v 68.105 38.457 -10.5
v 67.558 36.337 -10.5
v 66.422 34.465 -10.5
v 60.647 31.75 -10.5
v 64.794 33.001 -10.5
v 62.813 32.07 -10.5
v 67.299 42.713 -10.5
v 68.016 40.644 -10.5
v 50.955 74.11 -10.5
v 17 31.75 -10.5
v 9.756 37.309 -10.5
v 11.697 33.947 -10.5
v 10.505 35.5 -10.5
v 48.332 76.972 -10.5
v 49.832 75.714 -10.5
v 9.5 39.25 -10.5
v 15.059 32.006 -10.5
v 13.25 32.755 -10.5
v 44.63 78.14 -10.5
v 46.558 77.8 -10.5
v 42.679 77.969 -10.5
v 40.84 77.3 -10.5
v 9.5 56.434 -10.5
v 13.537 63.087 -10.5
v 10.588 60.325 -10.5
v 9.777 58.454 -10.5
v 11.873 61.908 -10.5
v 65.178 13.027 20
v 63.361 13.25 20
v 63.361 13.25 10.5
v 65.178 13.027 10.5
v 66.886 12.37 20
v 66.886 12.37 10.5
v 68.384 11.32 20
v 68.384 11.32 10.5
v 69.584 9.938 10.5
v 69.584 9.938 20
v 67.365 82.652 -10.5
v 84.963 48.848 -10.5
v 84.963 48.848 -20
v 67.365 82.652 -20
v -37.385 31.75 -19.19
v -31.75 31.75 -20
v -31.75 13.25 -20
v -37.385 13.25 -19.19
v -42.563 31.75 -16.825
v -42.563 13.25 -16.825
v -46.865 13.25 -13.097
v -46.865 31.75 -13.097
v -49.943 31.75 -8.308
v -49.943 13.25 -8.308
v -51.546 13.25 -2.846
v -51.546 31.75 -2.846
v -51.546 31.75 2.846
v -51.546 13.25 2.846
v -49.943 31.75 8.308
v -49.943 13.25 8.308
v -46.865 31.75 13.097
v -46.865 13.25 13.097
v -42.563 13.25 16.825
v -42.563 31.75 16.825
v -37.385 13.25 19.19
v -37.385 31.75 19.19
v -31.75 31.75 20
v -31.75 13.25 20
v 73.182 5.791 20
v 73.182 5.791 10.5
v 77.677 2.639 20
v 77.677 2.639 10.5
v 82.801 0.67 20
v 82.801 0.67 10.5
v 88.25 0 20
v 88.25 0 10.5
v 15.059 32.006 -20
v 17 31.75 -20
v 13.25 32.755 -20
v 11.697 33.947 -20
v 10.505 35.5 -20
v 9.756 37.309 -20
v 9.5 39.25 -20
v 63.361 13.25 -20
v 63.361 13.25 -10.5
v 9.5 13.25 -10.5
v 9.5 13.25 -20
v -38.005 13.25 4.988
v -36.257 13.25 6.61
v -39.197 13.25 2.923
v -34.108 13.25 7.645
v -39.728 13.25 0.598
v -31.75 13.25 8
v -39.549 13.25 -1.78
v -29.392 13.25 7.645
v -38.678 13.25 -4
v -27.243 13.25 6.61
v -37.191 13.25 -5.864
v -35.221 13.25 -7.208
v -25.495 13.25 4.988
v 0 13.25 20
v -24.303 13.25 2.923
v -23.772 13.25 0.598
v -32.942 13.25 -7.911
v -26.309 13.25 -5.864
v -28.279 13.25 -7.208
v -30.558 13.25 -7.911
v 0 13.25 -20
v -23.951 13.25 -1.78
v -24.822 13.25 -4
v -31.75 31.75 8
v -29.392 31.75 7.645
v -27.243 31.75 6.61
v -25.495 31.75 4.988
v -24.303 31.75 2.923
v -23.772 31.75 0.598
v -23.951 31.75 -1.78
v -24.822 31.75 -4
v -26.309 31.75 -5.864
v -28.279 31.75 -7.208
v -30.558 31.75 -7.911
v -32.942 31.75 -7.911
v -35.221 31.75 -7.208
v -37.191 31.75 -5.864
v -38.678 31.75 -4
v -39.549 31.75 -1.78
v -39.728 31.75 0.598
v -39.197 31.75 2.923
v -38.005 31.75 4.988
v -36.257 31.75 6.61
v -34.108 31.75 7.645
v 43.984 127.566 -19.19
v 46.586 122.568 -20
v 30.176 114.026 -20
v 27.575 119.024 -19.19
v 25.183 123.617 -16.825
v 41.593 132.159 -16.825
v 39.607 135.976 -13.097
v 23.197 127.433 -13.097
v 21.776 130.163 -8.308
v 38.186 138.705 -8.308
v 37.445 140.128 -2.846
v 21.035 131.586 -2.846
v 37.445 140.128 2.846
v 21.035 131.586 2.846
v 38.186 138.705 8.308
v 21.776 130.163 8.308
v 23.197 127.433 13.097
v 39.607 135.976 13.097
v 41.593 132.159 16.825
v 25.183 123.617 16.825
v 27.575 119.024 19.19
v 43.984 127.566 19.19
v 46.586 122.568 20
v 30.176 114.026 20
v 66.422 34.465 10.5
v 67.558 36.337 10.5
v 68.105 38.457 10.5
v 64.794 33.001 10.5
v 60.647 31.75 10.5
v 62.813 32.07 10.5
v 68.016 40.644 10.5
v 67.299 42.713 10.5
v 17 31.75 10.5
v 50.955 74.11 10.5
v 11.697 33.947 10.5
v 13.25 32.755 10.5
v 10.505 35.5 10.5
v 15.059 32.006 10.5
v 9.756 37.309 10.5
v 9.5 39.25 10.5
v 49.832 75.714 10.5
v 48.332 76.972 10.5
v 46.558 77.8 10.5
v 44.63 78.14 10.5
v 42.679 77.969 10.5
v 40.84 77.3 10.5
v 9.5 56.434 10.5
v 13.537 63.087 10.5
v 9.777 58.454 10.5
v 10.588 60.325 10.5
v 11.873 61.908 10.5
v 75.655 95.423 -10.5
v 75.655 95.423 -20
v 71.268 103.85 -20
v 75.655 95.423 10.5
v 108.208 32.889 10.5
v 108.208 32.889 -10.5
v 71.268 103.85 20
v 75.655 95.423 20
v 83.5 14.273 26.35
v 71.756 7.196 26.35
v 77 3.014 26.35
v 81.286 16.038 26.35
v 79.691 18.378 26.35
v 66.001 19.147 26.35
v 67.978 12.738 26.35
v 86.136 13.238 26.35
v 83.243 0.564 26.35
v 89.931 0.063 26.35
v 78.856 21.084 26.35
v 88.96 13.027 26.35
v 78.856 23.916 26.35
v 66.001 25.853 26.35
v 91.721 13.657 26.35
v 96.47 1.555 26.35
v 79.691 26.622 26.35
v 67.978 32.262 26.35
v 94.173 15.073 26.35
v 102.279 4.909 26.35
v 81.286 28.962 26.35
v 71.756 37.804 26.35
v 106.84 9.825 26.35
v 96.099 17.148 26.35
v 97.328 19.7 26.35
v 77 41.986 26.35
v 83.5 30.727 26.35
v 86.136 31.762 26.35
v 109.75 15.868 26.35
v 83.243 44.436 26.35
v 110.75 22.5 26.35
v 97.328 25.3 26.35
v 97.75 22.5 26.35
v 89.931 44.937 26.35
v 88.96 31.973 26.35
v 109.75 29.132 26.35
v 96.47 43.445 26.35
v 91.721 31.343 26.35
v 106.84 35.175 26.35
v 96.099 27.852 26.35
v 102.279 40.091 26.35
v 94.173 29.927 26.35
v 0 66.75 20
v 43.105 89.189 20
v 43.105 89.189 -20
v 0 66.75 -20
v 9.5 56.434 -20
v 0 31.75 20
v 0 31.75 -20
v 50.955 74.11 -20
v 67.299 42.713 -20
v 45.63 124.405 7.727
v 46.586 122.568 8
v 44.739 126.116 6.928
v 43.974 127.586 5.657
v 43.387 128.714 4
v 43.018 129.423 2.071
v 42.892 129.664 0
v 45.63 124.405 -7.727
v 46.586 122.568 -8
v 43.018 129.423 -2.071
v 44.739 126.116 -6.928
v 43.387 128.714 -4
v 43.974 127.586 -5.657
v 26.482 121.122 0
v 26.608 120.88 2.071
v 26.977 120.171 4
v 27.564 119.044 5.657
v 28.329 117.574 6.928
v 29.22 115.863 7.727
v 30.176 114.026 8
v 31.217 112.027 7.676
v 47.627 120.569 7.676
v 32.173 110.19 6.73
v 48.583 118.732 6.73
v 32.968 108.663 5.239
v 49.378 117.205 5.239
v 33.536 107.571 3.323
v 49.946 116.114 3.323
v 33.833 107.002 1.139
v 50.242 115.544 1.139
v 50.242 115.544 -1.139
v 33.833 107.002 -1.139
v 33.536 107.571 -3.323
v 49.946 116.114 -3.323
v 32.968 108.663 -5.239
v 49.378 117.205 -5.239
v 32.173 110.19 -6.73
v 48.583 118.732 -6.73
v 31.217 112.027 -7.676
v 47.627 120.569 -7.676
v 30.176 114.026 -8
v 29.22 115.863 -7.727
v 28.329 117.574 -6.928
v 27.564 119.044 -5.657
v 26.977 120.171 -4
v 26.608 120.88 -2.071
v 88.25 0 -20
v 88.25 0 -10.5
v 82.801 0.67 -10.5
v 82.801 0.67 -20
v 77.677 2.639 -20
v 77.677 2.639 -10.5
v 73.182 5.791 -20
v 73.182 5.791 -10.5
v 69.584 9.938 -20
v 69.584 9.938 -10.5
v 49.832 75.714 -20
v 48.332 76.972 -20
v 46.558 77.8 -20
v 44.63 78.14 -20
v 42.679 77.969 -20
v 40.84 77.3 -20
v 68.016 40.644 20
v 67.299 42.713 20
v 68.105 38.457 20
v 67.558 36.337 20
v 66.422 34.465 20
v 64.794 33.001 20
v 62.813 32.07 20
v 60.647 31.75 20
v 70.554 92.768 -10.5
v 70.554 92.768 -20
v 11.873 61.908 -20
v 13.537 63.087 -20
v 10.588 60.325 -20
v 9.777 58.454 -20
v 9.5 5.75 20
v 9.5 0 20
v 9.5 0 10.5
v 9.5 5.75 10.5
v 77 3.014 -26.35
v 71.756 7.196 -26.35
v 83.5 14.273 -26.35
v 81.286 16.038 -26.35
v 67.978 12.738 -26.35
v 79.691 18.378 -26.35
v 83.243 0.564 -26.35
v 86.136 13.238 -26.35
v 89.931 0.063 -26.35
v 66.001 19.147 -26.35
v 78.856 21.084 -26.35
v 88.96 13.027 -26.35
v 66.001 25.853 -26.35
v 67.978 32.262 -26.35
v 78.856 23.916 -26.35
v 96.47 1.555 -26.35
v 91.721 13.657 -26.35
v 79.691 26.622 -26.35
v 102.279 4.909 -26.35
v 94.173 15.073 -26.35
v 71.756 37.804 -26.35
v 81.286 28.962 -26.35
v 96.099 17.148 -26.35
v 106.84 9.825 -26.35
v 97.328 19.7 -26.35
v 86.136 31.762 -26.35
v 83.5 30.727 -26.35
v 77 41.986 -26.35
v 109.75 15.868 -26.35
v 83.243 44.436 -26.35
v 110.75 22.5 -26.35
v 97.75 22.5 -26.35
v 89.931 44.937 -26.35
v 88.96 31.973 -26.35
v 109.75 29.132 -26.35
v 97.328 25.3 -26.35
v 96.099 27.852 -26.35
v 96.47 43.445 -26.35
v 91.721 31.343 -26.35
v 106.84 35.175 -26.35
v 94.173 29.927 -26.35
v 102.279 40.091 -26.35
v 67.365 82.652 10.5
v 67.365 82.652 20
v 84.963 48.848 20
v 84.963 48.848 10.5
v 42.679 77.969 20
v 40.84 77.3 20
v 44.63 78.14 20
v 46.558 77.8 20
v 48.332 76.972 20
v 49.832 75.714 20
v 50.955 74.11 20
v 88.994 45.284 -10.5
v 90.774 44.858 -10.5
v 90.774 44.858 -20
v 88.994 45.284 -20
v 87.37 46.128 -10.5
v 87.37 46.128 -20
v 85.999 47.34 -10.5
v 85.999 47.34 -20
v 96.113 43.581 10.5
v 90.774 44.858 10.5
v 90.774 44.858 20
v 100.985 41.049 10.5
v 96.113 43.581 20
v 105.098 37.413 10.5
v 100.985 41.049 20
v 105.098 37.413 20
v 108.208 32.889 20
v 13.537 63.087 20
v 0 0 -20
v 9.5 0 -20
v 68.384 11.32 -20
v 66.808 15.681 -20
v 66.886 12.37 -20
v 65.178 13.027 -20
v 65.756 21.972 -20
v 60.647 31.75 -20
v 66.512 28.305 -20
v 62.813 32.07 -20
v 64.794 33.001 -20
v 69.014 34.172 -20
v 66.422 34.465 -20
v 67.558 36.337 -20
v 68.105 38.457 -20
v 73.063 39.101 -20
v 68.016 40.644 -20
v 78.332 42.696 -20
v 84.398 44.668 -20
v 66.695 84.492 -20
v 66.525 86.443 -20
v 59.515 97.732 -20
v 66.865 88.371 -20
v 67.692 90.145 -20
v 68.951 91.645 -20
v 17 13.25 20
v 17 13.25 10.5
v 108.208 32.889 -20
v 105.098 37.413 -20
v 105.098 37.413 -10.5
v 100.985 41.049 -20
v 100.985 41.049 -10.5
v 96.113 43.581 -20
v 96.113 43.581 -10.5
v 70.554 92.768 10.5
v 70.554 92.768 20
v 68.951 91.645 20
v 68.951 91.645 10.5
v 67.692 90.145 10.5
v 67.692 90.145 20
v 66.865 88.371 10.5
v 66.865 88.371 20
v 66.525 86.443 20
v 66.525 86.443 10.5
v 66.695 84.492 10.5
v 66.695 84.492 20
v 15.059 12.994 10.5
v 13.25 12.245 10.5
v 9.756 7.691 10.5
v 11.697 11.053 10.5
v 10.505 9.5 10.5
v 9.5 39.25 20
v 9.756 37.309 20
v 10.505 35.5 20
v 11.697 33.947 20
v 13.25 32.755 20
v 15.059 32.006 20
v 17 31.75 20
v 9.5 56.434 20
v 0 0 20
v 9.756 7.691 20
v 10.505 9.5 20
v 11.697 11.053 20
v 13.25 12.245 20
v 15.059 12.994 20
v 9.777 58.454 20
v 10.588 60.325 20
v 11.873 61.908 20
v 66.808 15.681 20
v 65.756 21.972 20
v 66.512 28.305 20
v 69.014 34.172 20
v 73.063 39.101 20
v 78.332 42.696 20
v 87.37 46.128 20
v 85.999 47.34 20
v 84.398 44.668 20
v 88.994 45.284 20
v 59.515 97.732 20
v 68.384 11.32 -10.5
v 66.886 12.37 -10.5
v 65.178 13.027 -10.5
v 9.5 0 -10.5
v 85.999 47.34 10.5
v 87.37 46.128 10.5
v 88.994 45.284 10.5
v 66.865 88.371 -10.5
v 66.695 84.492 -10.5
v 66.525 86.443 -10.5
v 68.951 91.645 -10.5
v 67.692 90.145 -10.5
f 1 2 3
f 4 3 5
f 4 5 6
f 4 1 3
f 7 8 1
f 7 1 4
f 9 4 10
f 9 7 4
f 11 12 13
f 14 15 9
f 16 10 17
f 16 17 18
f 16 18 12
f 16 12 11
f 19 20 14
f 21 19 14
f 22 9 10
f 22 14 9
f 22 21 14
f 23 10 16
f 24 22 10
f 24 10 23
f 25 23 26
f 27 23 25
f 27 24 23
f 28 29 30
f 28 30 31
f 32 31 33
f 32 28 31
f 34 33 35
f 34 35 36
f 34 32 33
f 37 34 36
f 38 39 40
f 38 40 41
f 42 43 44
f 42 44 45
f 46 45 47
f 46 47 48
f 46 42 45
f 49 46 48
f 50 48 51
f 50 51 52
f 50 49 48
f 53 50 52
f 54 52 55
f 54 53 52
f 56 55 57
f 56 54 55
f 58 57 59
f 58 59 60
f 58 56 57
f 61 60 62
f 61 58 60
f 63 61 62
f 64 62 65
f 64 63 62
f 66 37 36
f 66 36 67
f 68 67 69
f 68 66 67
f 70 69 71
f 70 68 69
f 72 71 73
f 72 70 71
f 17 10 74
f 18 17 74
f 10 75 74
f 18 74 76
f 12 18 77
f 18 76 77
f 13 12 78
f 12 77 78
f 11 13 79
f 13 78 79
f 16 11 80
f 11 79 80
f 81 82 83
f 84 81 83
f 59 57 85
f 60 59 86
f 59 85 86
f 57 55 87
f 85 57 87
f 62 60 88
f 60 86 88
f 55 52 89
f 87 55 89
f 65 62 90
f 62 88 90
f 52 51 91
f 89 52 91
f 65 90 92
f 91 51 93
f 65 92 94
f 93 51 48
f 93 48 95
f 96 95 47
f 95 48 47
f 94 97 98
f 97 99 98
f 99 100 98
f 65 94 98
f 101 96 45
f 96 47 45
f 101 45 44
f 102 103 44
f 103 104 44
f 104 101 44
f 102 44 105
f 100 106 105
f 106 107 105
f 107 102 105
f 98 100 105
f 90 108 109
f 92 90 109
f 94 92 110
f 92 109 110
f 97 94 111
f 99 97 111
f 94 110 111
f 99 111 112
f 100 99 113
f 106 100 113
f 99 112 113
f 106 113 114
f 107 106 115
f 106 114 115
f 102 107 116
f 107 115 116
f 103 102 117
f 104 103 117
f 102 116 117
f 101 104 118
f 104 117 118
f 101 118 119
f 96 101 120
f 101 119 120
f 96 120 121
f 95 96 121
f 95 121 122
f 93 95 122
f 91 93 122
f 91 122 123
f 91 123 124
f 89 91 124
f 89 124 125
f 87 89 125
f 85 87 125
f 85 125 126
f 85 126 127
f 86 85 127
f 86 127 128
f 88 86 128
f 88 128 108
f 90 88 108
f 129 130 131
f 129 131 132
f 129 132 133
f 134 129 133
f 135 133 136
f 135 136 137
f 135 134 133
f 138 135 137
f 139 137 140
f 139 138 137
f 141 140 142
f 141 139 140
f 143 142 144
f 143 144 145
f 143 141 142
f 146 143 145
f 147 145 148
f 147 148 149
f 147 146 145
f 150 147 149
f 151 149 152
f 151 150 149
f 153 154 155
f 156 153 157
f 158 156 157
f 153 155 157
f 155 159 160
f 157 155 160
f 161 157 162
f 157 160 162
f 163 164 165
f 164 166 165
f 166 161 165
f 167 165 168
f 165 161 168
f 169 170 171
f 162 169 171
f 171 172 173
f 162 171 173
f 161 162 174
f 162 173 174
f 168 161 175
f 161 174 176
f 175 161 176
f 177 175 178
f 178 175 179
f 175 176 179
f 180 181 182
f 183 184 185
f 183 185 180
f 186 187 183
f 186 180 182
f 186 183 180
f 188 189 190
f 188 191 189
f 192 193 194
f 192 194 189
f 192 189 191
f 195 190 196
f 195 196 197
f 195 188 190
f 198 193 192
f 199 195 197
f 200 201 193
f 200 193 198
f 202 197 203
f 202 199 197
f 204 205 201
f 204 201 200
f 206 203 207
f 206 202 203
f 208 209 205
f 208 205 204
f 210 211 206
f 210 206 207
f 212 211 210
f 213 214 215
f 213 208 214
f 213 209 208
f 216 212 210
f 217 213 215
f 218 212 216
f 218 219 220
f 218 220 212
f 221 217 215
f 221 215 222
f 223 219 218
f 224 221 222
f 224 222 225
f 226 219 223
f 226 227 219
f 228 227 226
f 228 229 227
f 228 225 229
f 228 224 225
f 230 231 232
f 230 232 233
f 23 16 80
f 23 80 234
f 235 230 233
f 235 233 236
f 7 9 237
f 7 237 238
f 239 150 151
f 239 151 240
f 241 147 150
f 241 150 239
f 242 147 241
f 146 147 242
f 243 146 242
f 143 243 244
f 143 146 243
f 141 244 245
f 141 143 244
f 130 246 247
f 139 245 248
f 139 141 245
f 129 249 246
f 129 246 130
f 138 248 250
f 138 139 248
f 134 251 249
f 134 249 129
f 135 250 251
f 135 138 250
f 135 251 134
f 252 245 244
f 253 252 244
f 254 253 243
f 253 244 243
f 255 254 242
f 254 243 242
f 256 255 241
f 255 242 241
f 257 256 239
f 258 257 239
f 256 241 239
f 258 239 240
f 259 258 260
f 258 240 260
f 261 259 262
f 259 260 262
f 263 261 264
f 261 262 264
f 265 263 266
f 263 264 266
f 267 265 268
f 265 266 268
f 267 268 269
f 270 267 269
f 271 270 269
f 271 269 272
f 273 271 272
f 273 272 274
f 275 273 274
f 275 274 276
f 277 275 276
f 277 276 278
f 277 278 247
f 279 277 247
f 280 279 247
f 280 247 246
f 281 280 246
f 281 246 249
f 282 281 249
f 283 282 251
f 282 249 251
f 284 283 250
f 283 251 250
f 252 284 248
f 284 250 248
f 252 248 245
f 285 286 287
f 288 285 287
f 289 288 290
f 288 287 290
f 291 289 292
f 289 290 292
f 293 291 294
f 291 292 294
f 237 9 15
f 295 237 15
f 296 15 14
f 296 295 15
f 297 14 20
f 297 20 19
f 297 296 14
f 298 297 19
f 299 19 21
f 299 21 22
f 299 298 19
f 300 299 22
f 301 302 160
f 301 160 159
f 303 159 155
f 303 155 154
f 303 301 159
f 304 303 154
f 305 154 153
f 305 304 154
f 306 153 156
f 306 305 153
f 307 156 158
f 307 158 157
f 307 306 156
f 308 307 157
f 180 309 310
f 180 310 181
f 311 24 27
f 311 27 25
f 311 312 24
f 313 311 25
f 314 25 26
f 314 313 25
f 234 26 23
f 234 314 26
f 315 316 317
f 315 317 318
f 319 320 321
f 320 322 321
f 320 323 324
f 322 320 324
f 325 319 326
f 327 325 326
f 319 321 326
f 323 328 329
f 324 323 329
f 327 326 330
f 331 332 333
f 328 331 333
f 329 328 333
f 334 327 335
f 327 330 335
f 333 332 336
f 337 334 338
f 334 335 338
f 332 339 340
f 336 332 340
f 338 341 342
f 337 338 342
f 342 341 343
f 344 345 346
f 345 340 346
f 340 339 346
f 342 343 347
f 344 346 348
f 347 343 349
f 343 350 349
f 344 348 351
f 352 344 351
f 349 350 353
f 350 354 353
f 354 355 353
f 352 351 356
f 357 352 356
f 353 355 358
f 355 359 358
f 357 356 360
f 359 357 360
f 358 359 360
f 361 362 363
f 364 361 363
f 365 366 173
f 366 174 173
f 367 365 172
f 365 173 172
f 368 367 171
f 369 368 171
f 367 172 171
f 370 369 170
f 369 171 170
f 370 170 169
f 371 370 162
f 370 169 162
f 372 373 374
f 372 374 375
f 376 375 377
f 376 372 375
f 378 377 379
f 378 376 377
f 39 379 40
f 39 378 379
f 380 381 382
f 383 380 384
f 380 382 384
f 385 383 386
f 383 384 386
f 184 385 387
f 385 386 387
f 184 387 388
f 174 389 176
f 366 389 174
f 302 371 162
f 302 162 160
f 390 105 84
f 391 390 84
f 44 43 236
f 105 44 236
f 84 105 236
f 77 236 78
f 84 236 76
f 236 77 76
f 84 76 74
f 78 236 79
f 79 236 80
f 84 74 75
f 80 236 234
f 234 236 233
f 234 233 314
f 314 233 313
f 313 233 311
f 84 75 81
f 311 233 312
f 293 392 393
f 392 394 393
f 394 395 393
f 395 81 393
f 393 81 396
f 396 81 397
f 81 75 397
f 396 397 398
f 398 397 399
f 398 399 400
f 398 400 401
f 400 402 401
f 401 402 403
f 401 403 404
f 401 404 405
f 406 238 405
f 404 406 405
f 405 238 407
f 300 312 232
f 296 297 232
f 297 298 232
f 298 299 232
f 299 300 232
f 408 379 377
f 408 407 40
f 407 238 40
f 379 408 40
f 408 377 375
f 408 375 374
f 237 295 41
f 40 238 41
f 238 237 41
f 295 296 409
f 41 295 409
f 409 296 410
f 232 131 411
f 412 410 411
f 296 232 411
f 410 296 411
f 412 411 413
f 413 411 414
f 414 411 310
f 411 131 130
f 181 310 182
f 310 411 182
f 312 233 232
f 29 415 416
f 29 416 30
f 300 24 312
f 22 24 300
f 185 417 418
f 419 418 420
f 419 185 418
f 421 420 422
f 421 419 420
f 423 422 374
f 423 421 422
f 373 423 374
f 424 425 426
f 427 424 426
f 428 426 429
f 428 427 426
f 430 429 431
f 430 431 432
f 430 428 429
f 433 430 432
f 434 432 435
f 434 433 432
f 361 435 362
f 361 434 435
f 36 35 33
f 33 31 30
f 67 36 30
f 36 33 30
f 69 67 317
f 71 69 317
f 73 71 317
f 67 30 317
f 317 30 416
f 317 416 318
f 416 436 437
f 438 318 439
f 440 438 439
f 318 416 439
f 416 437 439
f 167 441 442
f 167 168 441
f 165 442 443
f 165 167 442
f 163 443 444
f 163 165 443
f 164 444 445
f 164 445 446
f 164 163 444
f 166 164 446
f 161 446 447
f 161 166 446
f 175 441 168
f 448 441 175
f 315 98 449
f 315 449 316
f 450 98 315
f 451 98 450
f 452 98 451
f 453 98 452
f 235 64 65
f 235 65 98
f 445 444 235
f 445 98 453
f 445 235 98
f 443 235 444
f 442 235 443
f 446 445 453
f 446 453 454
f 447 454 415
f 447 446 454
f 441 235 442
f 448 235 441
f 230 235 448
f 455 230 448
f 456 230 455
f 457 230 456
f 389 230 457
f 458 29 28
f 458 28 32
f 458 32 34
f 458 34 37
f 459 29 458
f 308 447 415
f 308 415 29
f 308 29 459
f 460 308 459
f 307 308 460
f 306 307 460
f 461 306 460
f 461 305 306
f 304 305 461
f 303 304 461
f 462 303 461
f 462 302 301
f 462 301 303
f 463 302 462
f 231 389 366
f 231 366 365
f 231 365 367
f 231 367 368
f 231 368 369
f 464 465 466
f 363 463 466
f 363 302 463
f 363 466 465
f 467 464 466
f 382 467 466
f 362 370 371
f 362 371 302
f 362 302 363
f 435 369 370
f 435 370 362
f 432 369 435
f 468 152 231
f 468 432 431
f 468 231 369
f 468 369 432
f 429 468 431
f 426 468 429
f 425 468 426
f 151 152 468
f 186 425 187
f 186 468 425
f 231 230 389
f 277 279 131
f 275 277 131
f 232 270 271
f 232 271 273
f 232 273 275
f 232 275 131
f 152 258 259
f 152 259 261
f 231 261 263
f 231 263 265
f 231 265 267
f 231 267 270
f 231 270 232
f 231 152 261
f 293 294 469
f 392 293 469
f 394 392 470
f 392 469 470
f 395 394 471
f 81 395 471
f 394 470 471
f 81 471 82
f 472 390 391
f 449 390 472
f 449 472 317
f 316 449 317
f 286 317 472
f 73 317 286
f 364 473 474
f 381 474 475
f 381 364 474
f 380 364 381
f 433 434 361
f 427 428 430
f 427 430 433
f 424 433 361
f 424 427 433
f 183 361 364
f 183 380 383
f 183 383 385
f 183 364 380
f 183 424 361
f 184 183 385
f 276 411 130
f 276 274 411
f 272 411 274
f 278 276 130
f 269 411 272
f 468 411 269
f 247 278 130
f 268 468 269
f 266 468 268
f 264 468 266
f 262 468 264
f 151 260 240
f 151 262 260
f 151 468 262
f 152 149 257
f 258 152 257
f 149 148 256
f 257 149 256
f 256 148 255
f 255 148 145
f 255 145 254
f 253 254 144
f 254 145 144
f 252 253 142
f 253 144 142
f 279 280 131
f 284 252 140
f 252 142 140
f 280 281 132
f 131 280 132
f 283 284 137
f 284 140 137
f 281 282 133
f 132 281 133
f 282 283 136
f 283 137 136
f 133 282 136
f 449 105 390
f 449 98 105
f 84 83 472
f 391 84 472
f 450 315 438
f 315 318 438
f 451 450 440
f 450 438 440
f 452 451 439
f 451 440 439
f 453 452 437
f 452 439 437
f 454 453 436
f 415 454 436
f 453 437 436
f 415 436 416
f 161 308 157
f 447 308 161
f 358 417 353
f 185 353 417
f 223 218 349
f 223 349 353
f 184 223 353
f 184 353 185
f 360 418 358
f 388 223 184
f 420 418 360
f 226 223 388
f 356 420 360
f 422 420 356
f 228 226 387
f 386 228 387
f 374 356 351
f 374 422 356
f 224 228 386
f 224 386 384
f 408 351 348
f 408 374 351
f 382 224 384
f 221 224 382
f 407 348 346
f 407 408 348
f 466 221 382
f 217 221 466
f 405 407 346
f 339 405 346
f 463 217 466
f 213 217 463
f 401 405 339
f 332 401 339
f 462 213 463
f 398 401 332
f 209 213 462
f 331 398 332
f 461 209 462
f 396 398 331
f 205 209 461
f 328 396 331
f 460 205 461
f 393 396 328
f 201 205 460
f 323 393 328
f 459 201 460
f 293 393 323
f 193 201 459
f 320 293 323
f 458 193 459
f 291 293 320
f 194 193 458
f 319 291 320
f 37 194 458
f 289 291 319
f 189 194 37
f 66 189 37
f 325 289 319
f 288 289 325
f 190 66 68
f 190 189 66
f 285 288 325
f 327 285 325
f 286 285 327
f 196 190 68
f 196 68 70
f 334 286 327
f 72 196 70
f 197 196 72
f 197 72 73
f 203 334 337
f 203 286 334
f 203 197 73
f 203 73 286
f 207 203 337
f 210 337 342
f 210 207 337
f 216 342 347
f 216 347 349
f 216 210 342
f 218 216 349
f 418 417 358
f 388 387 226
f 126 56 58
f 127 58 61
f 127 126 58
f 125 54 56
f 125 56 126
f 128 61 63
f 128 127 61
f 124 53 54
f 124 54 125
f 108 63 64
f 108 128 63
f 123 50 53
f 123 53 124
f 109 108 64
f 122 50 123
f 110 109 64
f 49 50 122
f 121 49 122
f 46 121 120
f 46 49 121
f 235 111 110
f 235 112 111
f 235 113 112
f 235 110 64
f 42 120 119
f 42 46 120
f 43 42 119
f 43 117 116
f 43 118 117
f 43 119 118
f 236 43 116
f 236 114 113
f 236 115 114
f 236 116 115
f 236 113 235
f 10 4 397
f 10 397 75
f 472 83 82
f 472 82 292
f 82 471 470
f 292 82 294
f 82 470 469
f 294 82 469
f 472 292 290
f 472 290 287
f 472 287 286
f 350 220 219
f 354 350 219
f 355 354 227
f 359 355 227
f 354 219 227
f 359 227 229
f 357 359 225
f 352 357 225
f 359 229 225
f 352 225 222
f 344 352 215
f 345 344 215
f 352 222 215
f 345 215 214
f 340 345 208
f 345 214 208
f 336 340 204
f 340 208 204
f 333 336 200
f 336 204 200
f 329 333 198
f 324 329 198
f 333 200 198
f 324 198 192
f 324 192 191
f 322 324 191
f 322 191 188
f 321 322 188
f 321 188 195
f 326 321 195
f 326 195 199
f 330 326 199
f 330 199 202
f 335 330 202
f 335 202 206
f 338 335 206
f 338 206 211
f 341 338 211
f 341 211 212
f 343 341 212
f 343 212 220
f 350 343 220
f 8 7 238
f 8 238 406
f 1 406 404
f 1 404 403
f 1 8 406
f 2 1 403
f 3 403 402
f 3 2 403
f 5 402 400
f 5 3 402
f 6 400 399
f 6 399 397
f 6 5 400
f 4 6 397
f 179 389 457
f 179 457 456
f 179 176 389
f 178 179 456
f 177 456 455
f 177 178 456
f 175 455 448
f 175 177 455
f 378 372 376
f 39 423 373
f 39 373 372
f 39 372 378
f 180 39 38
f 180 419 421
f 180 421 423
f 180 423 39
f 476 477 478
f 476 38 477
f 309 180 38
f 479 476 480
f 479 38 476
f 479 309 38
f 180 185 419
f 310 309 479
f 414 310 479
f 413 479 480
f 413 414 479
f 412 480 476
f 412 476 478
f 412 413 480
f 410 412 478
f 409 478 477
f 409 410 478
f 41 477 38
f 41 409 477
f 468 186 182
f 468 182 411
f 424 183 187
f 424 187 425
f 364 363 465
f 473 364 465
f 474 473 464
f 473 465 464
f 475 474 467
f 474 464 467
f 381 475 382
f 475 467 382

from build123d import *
from build123d.topology import SkipClean

# Parameters (mm, degrees)
BOSS_EXTRU_1_DEPTH       = 20
ESQUISSE4_R              = 22.5
BOSS_EXTRU_2_DEPTH       = 26.35
ESQUISSE6_R              = 9.5
ENL_V_MAT_EXTRU_1_DEPTH  = 174.395073781
ENL_V_MAT_EXTRU_2_DEPTH  = 9.5
CONG_1_R                 = 7.5
ENL_V_START              = -9.5
ENL_V_MAT_EXTRU_10_DEPTH = 9.5
ENL_V_MAT_EXTRU_6_DEPTH  = 9.5
CONG_3_R                 = 7.5
ENL_V_MAT_EXTRU_7_DEPTH  = 9.5
CONG_4_R                 = 7.5
BOSS_EXTRU_4_DEPTH       = 18.5
ESQUISSE14_R             = 8
ENL_V_MAT_EXTRU_8_DEPTH  = 146.629175394
BOSS_EXTRU_5_DEPTH       = 18.5
ESQUISSE16_R             = 8
ENL_V_MAT_EXTRU_9_DEPTH  = 171.14276454


with BuildPart() as part:
    # Esquisse2 → Boss.-Extru.1 (new, symmetric)
    with BuildSketch(Plane.XY):
        with BuildLine():
            Line((0, 0), (88.25, 0))
            ThreePointArc((88.25, 0), (69.01448291, 34.172398309), (108.207743747, 32.889343798))
            Line((108.207743747, 32.889343798), (71.268065021, 103.849806406))
            Line((71.268065021, 103.849806406), (59.515171481, 97.731637281))
            Line((59.515171481, 97.731637281), (46.585999978, 122.568344656))
            Line((46.585999978, 122.568344656), (30.176299564, 114.025995311))
            Line((30.176299564, 114.025995311), (43.105471067, 89.189287936))
            Line((43.105471067, 89.189287936), (0, 66.75))
            Line((0, 66.75), (0, 31.75))
            Line((0, 31.75), (-31.75, 31.75))
            Line((-31.75, 31.75), (-31.75, 13.25))
            Line((-31.75, 13.25), (0, 13.25))
            Line((0, 13.25), (0, 0))
        make_face()
    extrude(amount=BOSS_EXTRU_1_DEPTH, both=True)

    # Esquisse4 → Boss.-Extru.2 (add, symmetric)
    with BuildSketch(Plane.XY):
        with Locations((88.25, 22.5)):
            Circle(ESQUISSE4_R)
    extrude(amount=BOSS_EXTRU_2_DEPTH, both=True)

    # Esquisse6 → Enlèv. mat.-Extru.1 (cut, through all)
    with BuildSketch(Plane.XY.offset(26.35)):
        with Locations((88.25, 22.5)):
            Circle(ESQUISSE6_R)
    extrude(amount=-ENL_V_MAT_EXTRU_1_DEPTH, mode=Mode.SUBTRACT)

    # Esquisse7 → Enlèv. mat.-Extru.2 (cut)
    with SkipClean():  # the faces are left unmerged after this step: merging them gives an invalid solid
        with BuildSketch(Plane.XY.offset(20)):
            with BuildLine():
                Line((9.5, 0), (9.5, 13.25))
                Line((9.5, 13.25), (63.361498639, 13.25))
                ThreePointArc((63.361498639, 13.25), (66.885966684, 12.370281338), (69.583623979, 9.9375))
                ThreePointArc((69.583623979, 9.9375), (77.676595865, 2.639155985), (88.25, 0))
                Line((88.25, 0), (9.5, 0))
            make_face()
        extrude(amount=-ENL_V_MAT_EXTRU_2_DEPTH, mode=Mode.SUBTRACT)

    # Congé1
    cong_1_edges = [part.edges().sort_by_distance(p)[0] for p in [
        (9.5, 13.25, 15.25),
    ]]
    fillet(cong_1_edges, radius=CONG_1_R)

    # Esquisse18 → Enlèv. mat.-Extru.10 (cut)
    with BuildSketch(Plane(origin=(0, 0, -20), x_dir=(-1, 0, 0), z_dir=(0, 0, -1)).offset(ENL_V_START)):
        with BuildLine():
            Line((-9.5, 0), (-88.25, 0))
            ThreePointArc((-88.25, 0), (-77.676595865, 2.639155985), (-69.583623979, 9.9375))
            ThreePointArc((-69.583623979, 9.9375), (-66.885966684, 12.370281338), (-63.361498639, 13.25))
            Line((-63.361498639, 13.25), (-9.5, 13.25))
            Line((-9.5, 13.25), (-9.5, 0))
        make_face()
    extrude(amount=ENL_V_MAT_EXTRU_10_DEPTH, mode=Mode.SUBTRACT)

    # Esquisse11 → Enlèv. mat.-Extru.6 (cut)
    with BuildSketch(Plane.XY.offset(20)):
        with BuildLine():
            Line((47.492082893, 80.762685021), (67.299435542, 42.713114599))
            ThreePointArc((67.299435542, 42.713114599), (67.058693323, 35.359200564), (60.646854293, 31.75))
            Line((60.646854293, 31.75), (9.5, 31.75))
            Line((9.5, 31.75), (9.5, 60.985258485))
            Line((9.5, 60.985258485), (47.492082893, 80.762685021))
        make_face()
        with BuildLine():
            Line((63.901783307, 89.305034366), (84.962619218, 48.847545001))
            ThreePointArc((84.962619218, 48.847545001), (87.370357433, 46.127512536), (90.77390035, 44.8579947))
            ThreePointArc((90.77390035, 44.8579947), (100.984529101, 41.049441193), (108.207743747, 32.889343798))
            Line((108.207743747, 32.889343798), (75.654676846, 95.423203491))
            Line((75.654676846, 95.423203491), (63.901783307, 89.305034366))
        make_face()
    extrude(amount=-ENL_V_MAT_EXTRU_6_DEPTH, mode=Mode.SUBTRACT)

    # Congé3
    cong_3_edges = [part.edges().sort_by_distance(p)[0] for p in [
        (63.901783307, 89.305034366, 15.25),
        (9.5, 60.985258485, 15.25),
        (47.492082893, 80.762685021, 15.25),
        (9.5, 31.75, 15.25),
    ]]
    fillet(cong_3_edges, radius=CONG_3_R)

    # Esquisse12 → Enlèv. mat.-Extru.7 (cut)
    with BuildSketch(Plane(origin=(0, 0, -20), x_dir=(-1, 0, 0), z_dir=(0, 0, -1)).offset(ENL_V_START)):
        with BuildLine():
            Line((-75.654676846, 95.423203491), (-108.207743747, 32.889343798))
            ThreePointArc((-108.207743747, 32.889343798), (-100.984529101, 41.049441193), (-90.77390035, 44.8579947))
            ThreePointArc((-90.77390035, 44.8579947), (-87.370357433, 46.127512536), (-84.962619218, 48.847545001))
            Line((-84.962619218, 48.847545001), (-63.901783307, 89.305034366))
            Line((-63.901783307, 89.305034366), (-75.654676846, 95.423203491))
        make_face()
        with BuildLine():
            Line((-9.5, 31.75), (-9.5, 60.985258485))
            Line((-9.5, 60.985258485), (-47.492082893, 80.762685021))
            Line((-47.492082893, 80.762685021), (-67.299435542, 42.713114599))
            ThreePointArc((-67.299435542, 42.713114599), (-67.058693323, 35.359200564), (-60.646854293, 31.75))
            Line((-60.646854293, 31.75), (-9.5, 31.75))
        make_face()
    extrude(amount=ENL_V_MAT_EXTRU_7_DEPTH, mode=Mode.SUBTRACT)

    # Congé4
    cong_4_edges = [part.edges().sort_by_distance(p)[0] for p in [
        (9.5, 31.75, -15.25),
        (47.492082893, 80.762685021, -15.25),
        (9.5, 60.985258485, -15.25),
        (63.901783307, 89.305034366, -15.25),
    ]]
    fillet(cong_4_edges, radius=CONG_4_R)

    # Esquisse13 → Boss.-Extru.4 (add)
    with BuildSketch(Plane(origin=(0, 31.75, 0), x_dir=(1, 0, 0), z_dir=(0, 1, 0))):
        with BuildLine():
            Line((-31.75, -20), (-31.75, 20))
            ThreePointArc((-31.75, 20), (-51.75, 0), (-31.75, -20))
        make_face()
    extrude(amount=-BOSS_EXTRU_4_DEPTH)

    # Esquisse14 → Enlèv. mat.-Extru.8 (cut, through all)
    with BuildSketch(Plane(origin=(0, 31.75, 0), x_dir=(1, 0, 0), z_dir=(0, 1, 0))):
        with Locations(Location((-31.75, 0, 0), (0, 0, 270))):
            Circle(ESQUISSE14_R)
    extrude(amount=-ENL_V_MAT_EXTRU_8_DEPTH, mode=Mode.SUBTRACT)

    # Esquisse15 → Boss.-Extru.5 (add)
    with BuildSketch(Plane(origin=(86.854370959, 45.213523718, 0), x_dir=(0, 0, -1), z_dir=(0.8870108331782227, 0.4617486132350318, 0))):
        with BuildLine():
            Line((-20, 87.208428629), (20, 87.208428629))
            ThreePointArc((20, 87.208428629), (0, 107.208428629), (-20, 87.208428629))
        make_face()
    extrude(amount=-BOSS_EXTRU_5_DEPTH)

    # Esquisse16 → Enlèv. mat.-Extru.9 (cut, through all)
    with BuildSketch(Plane(origin=(86.854370959, 45.213523718, 0), x_dir=(0, 0, -1), z_dir=(0.8870108331782227, 0.4617486132350318, 0))):
        with Locations(Location((0, 87.208428629, 0), (0, 0, 90))):
            Circle(ESQUISSE16_R)
    extrude(amount=-ENL_V_MAT_EXTRU_9_DEPTH, mode=Mode.SUBTRACT)


solid = part.part
